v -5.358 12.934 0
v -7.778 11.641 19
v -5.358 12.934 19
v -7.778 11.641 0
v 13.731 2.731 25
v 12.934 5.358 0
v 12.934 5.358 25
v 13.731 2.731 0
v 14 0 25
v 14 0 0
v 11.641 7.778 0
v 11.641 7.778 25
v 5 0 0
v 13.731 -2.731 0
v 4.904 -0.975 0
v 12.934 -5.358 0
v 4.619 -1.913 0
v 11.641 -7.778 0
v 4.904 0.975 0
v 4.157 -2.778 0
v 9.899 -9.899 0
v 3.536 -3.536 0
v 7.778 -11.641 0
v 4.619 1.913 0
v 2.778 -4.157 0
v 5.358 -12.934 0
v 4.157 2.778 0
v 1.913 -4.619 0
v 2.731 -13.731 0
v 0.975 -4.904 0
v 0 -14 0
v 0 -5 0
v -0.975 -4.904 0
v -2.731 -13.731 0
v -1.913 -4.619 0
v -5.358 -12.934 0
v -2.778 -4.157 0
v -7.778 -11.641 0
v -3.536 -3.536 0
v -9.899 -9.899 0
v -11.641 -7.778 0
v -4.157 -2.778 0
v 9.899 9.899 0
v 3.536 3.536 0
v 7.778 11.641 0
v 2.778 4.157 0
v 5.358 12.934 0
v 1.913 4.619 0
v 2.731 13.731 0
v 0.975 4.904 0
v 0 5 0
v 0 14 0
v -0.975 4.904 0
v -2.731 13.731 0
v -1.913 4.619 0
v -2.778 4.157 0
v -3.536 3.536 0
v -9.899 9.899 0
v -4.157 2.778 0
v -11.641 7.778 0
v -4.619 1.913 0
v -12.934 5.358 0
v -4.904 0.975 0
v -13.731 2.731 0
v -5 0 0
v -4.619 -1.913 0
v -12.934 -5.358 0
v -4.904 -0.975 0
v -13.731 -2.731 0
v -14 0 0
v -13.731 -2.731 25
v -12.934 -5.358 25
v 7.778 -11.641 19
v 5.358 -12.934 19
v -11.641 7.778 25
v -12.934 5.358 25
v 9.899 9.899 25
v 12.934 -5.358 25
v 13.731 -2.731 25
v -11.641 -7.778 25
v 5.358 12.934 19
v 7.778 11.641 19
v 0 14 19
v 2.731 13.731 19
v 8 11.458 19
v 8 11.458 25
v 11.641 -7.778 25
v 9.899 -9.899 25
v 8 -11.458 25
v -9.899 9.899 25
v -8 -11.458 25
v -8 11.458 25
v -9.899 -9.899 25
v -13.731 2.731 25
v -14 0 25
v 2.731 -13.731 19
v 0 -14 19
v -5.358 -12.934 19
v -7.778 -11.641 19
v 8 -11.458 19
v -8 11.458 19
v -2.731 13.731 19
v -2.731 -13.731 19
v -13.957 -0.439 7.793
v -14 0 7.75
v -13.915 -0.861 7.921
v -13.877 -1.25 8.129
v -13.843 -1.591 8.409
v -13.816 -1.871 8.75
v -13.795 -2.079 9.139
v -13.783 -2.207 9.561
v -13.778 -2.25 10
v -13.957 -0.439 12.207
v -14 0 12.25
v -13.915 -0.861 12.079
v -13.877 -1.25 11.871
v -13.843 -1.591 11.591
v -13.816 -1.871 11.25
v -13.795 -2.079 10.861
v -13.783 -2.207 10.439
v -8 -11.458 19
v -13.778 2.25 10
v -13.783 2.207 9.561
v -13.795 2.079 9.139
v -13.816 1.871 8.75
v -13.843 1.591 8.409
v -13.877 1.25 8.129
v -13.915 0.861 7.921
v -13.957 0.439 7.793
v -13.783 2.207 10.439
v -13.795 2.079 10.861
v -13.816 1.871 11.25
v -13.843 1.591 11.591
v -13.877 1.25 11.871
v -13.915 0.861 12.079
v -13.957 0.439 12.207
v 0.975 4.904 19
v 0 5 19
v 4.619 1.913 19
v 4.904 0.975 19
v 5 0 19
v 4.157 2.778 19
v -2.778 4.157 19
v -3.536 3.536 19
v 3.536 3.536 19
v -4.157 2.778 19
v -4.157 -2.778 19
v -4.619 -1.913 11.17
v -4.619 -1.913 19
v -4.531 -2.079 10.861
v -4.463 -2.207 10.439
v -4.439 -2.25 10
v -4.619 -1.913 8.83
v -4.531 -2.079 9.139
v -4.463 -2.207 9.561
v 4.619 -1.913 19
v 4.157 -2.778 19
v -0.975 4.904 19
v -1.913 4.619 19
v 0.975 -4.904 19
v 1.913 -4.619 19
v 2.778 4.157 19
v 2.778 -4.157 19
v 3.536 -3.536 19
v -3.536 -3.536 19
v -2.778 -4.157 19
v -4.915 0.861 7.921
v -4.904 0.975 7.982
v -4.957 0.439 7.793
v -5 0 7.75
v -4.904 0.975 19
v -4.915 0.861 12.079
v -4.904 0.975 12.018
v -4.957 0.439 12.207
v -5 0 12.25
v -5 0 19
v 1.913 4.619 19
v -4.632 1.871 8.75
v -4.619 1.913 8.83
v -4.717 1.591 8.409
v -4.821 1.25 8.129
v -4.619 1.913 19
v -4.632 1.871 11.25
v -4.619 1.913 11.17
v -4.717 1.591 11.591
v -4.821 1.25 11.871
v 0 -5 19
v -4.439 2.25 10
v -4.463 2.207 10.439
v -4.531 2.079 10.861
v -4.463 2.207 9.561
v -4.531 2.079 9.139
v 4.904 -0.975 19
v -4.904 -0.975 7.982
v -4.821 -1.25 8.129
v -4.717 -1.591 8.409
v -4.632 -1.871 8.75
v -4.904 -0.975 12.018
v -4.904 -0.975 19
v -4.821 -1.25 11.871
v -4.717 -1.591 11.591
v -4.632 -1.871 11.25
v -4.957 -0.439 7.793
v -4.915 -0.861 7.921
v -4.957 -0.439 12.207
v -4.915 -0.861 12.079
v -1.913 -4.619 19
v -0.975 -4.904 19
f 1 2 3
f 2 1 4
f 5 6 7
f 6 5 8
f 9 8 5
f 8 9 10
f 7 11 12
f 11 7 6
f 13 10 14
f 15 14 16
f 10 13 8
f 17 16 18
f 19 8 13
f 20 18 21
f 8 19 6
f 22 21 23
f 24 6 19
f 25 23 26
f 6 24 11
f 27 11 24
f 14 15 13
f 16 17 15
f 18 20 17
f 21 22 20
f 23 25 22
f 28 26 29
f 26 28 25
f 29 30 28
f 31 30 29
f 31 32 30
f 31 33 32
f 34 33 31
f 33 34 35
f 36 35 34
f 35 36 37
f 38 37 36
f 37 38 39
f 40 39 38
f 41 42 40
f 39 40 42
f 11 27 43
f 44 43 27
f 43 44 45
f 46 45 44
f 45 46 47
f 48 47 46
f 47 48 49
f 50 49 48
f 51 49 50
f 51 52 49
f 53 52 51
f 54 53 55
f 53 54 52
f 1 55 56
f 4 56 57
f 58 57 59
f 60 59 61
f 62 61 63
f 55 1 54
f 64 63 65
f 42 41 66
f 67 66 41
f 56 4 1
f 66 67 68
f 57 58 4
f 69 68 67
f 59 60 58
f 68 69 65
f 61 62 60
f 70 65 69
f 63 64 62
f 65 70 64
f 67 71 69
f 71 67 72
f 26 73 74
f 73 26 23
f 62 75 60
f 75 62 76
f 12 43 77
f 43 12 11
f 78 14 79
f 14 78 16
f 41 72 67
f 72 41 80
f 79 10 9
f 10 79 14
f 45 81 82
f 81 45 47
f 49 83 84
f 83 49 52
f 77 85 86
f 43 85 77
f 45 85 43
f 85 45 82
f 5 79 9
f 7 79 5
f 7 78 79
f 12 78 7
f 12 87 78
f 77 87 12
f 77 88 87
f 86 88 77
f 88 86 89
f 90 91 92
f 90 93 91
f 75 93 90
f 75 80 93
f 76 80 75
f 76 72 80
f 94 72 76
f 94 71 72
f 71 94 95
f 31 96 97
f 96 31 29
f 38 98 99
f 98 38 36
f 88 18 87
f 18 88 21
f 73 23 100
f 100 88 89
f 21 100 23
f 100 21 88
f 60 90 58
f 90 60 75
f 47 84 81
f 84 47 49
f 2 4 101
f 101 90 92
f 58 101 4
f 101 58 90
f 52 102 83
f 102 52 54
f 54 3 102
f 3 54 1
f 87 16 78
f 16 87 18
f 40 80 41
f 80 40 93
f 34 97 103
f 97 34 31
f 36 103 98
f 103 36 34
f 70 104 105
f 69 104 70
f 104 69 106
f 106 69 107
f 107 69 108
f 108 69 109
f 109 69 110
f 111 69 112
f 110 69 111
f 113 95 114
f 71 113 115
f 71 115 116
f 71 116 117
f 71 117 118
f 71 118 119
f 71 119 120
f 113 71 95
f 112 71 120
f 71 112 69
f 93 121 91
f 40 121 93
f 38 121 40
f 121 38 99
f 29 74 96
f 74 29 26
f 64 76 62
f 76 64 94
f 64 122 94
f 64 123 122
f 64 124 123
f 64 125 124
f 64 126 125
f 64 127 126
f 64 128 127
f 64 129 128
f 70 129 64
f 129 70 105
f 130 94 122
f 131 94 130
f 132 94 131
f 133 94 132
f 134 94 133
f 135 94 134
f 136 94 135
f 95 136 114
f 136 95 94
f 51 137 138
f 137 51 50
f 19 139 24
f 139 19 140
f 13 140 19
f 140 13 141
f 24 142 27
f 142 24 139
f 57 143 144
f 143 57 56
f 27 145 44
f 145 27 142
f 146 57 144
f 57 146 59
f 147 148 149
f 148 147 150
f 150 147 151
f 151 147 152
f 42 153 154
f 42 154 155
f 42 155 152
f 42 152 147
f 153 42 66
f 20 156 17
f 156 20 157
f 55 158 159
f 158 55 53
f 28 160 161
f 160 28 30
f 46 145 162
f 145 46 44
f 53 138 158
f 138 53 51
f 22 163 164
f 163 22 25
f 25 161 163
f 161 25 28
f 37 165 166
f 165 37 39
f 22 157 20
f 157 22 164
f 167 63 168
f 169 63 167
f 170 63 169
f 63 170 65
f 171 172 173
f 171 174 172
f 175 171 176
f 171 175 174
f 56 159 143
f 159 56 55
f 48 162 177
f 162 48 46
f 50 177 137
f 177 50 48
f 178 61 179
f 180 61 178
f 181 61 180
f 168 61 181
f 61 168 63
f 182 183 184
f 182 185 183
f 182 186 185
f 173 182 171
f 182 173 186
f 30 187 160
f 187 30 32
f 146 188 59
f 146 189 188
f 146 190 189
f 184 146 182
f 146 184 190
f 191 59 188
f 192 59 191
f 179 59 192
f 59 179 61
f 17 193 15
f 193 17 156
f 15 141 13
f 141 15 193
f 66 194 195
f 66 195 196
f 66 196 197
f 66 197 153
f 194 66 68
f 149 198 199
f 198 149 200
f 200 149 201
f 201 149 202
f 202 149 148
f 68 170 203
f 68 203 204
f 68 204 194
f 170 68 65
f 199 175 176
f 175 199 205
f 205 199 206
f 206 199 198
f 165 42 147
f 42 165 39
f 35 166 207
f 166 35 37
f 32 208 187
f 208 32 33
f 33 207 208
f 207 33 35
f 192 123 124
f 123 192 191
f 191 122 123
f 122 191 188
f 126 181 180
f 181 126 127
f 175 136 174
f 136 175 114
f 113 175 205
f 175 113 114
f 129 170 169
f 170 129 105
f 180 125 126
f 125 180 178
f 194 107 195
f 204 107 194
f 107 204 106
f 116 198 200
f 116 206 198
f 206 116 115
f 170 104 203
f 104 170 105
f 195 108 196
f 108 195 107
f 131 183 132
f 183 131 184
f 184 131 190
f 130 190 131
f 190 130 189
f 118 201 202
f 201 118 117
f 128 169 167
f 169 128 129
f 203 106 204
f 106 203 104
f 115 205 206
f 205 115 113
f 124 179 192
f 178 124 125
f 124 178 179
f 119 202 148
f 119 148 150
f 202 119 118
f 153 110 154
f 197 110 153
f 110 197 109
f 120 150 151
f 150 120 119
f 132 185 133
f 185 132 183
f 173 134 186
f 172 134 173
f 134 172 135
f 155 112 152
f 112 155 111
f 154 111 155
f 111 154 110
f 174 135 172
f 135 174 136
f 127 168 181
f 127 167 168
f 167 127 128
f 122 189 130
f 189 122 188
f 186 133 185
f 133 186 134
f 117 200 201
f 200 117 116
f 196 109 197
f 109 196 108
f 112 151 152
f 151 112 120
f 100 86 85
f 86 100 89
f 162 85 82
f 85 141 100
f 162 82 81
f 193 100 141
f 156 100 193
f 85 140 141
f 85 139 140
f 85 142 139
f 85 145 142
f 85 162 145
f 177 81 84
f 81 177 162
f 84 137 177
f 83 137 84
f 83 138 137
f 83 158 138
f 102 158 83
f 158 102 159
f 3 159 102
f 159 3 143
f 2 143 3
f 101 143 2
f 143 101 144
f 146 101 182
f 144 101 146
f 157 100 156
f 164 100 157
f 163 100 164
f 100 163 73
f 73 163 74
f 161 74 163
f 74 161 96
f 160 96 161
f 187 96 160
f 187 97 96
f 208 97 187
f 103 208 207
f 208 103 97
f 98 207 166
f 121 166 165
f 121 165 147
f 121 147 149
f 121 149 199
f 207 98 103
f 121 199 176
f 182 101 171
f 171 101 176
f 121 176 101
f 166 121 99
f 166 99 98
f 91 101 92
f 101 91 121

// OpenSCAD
$fn = 32;

// ----------------------------------------------------------------------
// Oldham coupling hub: 28 x 25 mm
// ----------------------------------------------------------------------

// --- parameters (mm) ---
hub_d = 28;               // hub diameter
hub_l = 20;               // hub length
bore_d = 10;              // shaft bore
tongue_w = 16;            // drive tongue width
tongue_h = 5;             // drive tongue height
set_d = 4.5;              // set screw tap hole

module hub() {
  /* the slot side is a raised disc with a groove milled across it */
  cylinder(h = hub_l + tongue_h, d = hub_d);
}

difference() {
  hub();
  translate([0, 0, -1]) cylinder(h = hub_l + tongue_h + 2, d = bore_d);
  translate([-hub_d / 2 - 1, 0, hub_l * 0.5])
    rotate([0, 90, 0]) cylinder(h = hub_d / 2 + 2, d = set_d);
  translate([-tongue_w / 2, -hub_d / 2 - 1, hub_l - 1])
    cube([tongue_w, hub_d + 2, tongue_h + 1]);
}
